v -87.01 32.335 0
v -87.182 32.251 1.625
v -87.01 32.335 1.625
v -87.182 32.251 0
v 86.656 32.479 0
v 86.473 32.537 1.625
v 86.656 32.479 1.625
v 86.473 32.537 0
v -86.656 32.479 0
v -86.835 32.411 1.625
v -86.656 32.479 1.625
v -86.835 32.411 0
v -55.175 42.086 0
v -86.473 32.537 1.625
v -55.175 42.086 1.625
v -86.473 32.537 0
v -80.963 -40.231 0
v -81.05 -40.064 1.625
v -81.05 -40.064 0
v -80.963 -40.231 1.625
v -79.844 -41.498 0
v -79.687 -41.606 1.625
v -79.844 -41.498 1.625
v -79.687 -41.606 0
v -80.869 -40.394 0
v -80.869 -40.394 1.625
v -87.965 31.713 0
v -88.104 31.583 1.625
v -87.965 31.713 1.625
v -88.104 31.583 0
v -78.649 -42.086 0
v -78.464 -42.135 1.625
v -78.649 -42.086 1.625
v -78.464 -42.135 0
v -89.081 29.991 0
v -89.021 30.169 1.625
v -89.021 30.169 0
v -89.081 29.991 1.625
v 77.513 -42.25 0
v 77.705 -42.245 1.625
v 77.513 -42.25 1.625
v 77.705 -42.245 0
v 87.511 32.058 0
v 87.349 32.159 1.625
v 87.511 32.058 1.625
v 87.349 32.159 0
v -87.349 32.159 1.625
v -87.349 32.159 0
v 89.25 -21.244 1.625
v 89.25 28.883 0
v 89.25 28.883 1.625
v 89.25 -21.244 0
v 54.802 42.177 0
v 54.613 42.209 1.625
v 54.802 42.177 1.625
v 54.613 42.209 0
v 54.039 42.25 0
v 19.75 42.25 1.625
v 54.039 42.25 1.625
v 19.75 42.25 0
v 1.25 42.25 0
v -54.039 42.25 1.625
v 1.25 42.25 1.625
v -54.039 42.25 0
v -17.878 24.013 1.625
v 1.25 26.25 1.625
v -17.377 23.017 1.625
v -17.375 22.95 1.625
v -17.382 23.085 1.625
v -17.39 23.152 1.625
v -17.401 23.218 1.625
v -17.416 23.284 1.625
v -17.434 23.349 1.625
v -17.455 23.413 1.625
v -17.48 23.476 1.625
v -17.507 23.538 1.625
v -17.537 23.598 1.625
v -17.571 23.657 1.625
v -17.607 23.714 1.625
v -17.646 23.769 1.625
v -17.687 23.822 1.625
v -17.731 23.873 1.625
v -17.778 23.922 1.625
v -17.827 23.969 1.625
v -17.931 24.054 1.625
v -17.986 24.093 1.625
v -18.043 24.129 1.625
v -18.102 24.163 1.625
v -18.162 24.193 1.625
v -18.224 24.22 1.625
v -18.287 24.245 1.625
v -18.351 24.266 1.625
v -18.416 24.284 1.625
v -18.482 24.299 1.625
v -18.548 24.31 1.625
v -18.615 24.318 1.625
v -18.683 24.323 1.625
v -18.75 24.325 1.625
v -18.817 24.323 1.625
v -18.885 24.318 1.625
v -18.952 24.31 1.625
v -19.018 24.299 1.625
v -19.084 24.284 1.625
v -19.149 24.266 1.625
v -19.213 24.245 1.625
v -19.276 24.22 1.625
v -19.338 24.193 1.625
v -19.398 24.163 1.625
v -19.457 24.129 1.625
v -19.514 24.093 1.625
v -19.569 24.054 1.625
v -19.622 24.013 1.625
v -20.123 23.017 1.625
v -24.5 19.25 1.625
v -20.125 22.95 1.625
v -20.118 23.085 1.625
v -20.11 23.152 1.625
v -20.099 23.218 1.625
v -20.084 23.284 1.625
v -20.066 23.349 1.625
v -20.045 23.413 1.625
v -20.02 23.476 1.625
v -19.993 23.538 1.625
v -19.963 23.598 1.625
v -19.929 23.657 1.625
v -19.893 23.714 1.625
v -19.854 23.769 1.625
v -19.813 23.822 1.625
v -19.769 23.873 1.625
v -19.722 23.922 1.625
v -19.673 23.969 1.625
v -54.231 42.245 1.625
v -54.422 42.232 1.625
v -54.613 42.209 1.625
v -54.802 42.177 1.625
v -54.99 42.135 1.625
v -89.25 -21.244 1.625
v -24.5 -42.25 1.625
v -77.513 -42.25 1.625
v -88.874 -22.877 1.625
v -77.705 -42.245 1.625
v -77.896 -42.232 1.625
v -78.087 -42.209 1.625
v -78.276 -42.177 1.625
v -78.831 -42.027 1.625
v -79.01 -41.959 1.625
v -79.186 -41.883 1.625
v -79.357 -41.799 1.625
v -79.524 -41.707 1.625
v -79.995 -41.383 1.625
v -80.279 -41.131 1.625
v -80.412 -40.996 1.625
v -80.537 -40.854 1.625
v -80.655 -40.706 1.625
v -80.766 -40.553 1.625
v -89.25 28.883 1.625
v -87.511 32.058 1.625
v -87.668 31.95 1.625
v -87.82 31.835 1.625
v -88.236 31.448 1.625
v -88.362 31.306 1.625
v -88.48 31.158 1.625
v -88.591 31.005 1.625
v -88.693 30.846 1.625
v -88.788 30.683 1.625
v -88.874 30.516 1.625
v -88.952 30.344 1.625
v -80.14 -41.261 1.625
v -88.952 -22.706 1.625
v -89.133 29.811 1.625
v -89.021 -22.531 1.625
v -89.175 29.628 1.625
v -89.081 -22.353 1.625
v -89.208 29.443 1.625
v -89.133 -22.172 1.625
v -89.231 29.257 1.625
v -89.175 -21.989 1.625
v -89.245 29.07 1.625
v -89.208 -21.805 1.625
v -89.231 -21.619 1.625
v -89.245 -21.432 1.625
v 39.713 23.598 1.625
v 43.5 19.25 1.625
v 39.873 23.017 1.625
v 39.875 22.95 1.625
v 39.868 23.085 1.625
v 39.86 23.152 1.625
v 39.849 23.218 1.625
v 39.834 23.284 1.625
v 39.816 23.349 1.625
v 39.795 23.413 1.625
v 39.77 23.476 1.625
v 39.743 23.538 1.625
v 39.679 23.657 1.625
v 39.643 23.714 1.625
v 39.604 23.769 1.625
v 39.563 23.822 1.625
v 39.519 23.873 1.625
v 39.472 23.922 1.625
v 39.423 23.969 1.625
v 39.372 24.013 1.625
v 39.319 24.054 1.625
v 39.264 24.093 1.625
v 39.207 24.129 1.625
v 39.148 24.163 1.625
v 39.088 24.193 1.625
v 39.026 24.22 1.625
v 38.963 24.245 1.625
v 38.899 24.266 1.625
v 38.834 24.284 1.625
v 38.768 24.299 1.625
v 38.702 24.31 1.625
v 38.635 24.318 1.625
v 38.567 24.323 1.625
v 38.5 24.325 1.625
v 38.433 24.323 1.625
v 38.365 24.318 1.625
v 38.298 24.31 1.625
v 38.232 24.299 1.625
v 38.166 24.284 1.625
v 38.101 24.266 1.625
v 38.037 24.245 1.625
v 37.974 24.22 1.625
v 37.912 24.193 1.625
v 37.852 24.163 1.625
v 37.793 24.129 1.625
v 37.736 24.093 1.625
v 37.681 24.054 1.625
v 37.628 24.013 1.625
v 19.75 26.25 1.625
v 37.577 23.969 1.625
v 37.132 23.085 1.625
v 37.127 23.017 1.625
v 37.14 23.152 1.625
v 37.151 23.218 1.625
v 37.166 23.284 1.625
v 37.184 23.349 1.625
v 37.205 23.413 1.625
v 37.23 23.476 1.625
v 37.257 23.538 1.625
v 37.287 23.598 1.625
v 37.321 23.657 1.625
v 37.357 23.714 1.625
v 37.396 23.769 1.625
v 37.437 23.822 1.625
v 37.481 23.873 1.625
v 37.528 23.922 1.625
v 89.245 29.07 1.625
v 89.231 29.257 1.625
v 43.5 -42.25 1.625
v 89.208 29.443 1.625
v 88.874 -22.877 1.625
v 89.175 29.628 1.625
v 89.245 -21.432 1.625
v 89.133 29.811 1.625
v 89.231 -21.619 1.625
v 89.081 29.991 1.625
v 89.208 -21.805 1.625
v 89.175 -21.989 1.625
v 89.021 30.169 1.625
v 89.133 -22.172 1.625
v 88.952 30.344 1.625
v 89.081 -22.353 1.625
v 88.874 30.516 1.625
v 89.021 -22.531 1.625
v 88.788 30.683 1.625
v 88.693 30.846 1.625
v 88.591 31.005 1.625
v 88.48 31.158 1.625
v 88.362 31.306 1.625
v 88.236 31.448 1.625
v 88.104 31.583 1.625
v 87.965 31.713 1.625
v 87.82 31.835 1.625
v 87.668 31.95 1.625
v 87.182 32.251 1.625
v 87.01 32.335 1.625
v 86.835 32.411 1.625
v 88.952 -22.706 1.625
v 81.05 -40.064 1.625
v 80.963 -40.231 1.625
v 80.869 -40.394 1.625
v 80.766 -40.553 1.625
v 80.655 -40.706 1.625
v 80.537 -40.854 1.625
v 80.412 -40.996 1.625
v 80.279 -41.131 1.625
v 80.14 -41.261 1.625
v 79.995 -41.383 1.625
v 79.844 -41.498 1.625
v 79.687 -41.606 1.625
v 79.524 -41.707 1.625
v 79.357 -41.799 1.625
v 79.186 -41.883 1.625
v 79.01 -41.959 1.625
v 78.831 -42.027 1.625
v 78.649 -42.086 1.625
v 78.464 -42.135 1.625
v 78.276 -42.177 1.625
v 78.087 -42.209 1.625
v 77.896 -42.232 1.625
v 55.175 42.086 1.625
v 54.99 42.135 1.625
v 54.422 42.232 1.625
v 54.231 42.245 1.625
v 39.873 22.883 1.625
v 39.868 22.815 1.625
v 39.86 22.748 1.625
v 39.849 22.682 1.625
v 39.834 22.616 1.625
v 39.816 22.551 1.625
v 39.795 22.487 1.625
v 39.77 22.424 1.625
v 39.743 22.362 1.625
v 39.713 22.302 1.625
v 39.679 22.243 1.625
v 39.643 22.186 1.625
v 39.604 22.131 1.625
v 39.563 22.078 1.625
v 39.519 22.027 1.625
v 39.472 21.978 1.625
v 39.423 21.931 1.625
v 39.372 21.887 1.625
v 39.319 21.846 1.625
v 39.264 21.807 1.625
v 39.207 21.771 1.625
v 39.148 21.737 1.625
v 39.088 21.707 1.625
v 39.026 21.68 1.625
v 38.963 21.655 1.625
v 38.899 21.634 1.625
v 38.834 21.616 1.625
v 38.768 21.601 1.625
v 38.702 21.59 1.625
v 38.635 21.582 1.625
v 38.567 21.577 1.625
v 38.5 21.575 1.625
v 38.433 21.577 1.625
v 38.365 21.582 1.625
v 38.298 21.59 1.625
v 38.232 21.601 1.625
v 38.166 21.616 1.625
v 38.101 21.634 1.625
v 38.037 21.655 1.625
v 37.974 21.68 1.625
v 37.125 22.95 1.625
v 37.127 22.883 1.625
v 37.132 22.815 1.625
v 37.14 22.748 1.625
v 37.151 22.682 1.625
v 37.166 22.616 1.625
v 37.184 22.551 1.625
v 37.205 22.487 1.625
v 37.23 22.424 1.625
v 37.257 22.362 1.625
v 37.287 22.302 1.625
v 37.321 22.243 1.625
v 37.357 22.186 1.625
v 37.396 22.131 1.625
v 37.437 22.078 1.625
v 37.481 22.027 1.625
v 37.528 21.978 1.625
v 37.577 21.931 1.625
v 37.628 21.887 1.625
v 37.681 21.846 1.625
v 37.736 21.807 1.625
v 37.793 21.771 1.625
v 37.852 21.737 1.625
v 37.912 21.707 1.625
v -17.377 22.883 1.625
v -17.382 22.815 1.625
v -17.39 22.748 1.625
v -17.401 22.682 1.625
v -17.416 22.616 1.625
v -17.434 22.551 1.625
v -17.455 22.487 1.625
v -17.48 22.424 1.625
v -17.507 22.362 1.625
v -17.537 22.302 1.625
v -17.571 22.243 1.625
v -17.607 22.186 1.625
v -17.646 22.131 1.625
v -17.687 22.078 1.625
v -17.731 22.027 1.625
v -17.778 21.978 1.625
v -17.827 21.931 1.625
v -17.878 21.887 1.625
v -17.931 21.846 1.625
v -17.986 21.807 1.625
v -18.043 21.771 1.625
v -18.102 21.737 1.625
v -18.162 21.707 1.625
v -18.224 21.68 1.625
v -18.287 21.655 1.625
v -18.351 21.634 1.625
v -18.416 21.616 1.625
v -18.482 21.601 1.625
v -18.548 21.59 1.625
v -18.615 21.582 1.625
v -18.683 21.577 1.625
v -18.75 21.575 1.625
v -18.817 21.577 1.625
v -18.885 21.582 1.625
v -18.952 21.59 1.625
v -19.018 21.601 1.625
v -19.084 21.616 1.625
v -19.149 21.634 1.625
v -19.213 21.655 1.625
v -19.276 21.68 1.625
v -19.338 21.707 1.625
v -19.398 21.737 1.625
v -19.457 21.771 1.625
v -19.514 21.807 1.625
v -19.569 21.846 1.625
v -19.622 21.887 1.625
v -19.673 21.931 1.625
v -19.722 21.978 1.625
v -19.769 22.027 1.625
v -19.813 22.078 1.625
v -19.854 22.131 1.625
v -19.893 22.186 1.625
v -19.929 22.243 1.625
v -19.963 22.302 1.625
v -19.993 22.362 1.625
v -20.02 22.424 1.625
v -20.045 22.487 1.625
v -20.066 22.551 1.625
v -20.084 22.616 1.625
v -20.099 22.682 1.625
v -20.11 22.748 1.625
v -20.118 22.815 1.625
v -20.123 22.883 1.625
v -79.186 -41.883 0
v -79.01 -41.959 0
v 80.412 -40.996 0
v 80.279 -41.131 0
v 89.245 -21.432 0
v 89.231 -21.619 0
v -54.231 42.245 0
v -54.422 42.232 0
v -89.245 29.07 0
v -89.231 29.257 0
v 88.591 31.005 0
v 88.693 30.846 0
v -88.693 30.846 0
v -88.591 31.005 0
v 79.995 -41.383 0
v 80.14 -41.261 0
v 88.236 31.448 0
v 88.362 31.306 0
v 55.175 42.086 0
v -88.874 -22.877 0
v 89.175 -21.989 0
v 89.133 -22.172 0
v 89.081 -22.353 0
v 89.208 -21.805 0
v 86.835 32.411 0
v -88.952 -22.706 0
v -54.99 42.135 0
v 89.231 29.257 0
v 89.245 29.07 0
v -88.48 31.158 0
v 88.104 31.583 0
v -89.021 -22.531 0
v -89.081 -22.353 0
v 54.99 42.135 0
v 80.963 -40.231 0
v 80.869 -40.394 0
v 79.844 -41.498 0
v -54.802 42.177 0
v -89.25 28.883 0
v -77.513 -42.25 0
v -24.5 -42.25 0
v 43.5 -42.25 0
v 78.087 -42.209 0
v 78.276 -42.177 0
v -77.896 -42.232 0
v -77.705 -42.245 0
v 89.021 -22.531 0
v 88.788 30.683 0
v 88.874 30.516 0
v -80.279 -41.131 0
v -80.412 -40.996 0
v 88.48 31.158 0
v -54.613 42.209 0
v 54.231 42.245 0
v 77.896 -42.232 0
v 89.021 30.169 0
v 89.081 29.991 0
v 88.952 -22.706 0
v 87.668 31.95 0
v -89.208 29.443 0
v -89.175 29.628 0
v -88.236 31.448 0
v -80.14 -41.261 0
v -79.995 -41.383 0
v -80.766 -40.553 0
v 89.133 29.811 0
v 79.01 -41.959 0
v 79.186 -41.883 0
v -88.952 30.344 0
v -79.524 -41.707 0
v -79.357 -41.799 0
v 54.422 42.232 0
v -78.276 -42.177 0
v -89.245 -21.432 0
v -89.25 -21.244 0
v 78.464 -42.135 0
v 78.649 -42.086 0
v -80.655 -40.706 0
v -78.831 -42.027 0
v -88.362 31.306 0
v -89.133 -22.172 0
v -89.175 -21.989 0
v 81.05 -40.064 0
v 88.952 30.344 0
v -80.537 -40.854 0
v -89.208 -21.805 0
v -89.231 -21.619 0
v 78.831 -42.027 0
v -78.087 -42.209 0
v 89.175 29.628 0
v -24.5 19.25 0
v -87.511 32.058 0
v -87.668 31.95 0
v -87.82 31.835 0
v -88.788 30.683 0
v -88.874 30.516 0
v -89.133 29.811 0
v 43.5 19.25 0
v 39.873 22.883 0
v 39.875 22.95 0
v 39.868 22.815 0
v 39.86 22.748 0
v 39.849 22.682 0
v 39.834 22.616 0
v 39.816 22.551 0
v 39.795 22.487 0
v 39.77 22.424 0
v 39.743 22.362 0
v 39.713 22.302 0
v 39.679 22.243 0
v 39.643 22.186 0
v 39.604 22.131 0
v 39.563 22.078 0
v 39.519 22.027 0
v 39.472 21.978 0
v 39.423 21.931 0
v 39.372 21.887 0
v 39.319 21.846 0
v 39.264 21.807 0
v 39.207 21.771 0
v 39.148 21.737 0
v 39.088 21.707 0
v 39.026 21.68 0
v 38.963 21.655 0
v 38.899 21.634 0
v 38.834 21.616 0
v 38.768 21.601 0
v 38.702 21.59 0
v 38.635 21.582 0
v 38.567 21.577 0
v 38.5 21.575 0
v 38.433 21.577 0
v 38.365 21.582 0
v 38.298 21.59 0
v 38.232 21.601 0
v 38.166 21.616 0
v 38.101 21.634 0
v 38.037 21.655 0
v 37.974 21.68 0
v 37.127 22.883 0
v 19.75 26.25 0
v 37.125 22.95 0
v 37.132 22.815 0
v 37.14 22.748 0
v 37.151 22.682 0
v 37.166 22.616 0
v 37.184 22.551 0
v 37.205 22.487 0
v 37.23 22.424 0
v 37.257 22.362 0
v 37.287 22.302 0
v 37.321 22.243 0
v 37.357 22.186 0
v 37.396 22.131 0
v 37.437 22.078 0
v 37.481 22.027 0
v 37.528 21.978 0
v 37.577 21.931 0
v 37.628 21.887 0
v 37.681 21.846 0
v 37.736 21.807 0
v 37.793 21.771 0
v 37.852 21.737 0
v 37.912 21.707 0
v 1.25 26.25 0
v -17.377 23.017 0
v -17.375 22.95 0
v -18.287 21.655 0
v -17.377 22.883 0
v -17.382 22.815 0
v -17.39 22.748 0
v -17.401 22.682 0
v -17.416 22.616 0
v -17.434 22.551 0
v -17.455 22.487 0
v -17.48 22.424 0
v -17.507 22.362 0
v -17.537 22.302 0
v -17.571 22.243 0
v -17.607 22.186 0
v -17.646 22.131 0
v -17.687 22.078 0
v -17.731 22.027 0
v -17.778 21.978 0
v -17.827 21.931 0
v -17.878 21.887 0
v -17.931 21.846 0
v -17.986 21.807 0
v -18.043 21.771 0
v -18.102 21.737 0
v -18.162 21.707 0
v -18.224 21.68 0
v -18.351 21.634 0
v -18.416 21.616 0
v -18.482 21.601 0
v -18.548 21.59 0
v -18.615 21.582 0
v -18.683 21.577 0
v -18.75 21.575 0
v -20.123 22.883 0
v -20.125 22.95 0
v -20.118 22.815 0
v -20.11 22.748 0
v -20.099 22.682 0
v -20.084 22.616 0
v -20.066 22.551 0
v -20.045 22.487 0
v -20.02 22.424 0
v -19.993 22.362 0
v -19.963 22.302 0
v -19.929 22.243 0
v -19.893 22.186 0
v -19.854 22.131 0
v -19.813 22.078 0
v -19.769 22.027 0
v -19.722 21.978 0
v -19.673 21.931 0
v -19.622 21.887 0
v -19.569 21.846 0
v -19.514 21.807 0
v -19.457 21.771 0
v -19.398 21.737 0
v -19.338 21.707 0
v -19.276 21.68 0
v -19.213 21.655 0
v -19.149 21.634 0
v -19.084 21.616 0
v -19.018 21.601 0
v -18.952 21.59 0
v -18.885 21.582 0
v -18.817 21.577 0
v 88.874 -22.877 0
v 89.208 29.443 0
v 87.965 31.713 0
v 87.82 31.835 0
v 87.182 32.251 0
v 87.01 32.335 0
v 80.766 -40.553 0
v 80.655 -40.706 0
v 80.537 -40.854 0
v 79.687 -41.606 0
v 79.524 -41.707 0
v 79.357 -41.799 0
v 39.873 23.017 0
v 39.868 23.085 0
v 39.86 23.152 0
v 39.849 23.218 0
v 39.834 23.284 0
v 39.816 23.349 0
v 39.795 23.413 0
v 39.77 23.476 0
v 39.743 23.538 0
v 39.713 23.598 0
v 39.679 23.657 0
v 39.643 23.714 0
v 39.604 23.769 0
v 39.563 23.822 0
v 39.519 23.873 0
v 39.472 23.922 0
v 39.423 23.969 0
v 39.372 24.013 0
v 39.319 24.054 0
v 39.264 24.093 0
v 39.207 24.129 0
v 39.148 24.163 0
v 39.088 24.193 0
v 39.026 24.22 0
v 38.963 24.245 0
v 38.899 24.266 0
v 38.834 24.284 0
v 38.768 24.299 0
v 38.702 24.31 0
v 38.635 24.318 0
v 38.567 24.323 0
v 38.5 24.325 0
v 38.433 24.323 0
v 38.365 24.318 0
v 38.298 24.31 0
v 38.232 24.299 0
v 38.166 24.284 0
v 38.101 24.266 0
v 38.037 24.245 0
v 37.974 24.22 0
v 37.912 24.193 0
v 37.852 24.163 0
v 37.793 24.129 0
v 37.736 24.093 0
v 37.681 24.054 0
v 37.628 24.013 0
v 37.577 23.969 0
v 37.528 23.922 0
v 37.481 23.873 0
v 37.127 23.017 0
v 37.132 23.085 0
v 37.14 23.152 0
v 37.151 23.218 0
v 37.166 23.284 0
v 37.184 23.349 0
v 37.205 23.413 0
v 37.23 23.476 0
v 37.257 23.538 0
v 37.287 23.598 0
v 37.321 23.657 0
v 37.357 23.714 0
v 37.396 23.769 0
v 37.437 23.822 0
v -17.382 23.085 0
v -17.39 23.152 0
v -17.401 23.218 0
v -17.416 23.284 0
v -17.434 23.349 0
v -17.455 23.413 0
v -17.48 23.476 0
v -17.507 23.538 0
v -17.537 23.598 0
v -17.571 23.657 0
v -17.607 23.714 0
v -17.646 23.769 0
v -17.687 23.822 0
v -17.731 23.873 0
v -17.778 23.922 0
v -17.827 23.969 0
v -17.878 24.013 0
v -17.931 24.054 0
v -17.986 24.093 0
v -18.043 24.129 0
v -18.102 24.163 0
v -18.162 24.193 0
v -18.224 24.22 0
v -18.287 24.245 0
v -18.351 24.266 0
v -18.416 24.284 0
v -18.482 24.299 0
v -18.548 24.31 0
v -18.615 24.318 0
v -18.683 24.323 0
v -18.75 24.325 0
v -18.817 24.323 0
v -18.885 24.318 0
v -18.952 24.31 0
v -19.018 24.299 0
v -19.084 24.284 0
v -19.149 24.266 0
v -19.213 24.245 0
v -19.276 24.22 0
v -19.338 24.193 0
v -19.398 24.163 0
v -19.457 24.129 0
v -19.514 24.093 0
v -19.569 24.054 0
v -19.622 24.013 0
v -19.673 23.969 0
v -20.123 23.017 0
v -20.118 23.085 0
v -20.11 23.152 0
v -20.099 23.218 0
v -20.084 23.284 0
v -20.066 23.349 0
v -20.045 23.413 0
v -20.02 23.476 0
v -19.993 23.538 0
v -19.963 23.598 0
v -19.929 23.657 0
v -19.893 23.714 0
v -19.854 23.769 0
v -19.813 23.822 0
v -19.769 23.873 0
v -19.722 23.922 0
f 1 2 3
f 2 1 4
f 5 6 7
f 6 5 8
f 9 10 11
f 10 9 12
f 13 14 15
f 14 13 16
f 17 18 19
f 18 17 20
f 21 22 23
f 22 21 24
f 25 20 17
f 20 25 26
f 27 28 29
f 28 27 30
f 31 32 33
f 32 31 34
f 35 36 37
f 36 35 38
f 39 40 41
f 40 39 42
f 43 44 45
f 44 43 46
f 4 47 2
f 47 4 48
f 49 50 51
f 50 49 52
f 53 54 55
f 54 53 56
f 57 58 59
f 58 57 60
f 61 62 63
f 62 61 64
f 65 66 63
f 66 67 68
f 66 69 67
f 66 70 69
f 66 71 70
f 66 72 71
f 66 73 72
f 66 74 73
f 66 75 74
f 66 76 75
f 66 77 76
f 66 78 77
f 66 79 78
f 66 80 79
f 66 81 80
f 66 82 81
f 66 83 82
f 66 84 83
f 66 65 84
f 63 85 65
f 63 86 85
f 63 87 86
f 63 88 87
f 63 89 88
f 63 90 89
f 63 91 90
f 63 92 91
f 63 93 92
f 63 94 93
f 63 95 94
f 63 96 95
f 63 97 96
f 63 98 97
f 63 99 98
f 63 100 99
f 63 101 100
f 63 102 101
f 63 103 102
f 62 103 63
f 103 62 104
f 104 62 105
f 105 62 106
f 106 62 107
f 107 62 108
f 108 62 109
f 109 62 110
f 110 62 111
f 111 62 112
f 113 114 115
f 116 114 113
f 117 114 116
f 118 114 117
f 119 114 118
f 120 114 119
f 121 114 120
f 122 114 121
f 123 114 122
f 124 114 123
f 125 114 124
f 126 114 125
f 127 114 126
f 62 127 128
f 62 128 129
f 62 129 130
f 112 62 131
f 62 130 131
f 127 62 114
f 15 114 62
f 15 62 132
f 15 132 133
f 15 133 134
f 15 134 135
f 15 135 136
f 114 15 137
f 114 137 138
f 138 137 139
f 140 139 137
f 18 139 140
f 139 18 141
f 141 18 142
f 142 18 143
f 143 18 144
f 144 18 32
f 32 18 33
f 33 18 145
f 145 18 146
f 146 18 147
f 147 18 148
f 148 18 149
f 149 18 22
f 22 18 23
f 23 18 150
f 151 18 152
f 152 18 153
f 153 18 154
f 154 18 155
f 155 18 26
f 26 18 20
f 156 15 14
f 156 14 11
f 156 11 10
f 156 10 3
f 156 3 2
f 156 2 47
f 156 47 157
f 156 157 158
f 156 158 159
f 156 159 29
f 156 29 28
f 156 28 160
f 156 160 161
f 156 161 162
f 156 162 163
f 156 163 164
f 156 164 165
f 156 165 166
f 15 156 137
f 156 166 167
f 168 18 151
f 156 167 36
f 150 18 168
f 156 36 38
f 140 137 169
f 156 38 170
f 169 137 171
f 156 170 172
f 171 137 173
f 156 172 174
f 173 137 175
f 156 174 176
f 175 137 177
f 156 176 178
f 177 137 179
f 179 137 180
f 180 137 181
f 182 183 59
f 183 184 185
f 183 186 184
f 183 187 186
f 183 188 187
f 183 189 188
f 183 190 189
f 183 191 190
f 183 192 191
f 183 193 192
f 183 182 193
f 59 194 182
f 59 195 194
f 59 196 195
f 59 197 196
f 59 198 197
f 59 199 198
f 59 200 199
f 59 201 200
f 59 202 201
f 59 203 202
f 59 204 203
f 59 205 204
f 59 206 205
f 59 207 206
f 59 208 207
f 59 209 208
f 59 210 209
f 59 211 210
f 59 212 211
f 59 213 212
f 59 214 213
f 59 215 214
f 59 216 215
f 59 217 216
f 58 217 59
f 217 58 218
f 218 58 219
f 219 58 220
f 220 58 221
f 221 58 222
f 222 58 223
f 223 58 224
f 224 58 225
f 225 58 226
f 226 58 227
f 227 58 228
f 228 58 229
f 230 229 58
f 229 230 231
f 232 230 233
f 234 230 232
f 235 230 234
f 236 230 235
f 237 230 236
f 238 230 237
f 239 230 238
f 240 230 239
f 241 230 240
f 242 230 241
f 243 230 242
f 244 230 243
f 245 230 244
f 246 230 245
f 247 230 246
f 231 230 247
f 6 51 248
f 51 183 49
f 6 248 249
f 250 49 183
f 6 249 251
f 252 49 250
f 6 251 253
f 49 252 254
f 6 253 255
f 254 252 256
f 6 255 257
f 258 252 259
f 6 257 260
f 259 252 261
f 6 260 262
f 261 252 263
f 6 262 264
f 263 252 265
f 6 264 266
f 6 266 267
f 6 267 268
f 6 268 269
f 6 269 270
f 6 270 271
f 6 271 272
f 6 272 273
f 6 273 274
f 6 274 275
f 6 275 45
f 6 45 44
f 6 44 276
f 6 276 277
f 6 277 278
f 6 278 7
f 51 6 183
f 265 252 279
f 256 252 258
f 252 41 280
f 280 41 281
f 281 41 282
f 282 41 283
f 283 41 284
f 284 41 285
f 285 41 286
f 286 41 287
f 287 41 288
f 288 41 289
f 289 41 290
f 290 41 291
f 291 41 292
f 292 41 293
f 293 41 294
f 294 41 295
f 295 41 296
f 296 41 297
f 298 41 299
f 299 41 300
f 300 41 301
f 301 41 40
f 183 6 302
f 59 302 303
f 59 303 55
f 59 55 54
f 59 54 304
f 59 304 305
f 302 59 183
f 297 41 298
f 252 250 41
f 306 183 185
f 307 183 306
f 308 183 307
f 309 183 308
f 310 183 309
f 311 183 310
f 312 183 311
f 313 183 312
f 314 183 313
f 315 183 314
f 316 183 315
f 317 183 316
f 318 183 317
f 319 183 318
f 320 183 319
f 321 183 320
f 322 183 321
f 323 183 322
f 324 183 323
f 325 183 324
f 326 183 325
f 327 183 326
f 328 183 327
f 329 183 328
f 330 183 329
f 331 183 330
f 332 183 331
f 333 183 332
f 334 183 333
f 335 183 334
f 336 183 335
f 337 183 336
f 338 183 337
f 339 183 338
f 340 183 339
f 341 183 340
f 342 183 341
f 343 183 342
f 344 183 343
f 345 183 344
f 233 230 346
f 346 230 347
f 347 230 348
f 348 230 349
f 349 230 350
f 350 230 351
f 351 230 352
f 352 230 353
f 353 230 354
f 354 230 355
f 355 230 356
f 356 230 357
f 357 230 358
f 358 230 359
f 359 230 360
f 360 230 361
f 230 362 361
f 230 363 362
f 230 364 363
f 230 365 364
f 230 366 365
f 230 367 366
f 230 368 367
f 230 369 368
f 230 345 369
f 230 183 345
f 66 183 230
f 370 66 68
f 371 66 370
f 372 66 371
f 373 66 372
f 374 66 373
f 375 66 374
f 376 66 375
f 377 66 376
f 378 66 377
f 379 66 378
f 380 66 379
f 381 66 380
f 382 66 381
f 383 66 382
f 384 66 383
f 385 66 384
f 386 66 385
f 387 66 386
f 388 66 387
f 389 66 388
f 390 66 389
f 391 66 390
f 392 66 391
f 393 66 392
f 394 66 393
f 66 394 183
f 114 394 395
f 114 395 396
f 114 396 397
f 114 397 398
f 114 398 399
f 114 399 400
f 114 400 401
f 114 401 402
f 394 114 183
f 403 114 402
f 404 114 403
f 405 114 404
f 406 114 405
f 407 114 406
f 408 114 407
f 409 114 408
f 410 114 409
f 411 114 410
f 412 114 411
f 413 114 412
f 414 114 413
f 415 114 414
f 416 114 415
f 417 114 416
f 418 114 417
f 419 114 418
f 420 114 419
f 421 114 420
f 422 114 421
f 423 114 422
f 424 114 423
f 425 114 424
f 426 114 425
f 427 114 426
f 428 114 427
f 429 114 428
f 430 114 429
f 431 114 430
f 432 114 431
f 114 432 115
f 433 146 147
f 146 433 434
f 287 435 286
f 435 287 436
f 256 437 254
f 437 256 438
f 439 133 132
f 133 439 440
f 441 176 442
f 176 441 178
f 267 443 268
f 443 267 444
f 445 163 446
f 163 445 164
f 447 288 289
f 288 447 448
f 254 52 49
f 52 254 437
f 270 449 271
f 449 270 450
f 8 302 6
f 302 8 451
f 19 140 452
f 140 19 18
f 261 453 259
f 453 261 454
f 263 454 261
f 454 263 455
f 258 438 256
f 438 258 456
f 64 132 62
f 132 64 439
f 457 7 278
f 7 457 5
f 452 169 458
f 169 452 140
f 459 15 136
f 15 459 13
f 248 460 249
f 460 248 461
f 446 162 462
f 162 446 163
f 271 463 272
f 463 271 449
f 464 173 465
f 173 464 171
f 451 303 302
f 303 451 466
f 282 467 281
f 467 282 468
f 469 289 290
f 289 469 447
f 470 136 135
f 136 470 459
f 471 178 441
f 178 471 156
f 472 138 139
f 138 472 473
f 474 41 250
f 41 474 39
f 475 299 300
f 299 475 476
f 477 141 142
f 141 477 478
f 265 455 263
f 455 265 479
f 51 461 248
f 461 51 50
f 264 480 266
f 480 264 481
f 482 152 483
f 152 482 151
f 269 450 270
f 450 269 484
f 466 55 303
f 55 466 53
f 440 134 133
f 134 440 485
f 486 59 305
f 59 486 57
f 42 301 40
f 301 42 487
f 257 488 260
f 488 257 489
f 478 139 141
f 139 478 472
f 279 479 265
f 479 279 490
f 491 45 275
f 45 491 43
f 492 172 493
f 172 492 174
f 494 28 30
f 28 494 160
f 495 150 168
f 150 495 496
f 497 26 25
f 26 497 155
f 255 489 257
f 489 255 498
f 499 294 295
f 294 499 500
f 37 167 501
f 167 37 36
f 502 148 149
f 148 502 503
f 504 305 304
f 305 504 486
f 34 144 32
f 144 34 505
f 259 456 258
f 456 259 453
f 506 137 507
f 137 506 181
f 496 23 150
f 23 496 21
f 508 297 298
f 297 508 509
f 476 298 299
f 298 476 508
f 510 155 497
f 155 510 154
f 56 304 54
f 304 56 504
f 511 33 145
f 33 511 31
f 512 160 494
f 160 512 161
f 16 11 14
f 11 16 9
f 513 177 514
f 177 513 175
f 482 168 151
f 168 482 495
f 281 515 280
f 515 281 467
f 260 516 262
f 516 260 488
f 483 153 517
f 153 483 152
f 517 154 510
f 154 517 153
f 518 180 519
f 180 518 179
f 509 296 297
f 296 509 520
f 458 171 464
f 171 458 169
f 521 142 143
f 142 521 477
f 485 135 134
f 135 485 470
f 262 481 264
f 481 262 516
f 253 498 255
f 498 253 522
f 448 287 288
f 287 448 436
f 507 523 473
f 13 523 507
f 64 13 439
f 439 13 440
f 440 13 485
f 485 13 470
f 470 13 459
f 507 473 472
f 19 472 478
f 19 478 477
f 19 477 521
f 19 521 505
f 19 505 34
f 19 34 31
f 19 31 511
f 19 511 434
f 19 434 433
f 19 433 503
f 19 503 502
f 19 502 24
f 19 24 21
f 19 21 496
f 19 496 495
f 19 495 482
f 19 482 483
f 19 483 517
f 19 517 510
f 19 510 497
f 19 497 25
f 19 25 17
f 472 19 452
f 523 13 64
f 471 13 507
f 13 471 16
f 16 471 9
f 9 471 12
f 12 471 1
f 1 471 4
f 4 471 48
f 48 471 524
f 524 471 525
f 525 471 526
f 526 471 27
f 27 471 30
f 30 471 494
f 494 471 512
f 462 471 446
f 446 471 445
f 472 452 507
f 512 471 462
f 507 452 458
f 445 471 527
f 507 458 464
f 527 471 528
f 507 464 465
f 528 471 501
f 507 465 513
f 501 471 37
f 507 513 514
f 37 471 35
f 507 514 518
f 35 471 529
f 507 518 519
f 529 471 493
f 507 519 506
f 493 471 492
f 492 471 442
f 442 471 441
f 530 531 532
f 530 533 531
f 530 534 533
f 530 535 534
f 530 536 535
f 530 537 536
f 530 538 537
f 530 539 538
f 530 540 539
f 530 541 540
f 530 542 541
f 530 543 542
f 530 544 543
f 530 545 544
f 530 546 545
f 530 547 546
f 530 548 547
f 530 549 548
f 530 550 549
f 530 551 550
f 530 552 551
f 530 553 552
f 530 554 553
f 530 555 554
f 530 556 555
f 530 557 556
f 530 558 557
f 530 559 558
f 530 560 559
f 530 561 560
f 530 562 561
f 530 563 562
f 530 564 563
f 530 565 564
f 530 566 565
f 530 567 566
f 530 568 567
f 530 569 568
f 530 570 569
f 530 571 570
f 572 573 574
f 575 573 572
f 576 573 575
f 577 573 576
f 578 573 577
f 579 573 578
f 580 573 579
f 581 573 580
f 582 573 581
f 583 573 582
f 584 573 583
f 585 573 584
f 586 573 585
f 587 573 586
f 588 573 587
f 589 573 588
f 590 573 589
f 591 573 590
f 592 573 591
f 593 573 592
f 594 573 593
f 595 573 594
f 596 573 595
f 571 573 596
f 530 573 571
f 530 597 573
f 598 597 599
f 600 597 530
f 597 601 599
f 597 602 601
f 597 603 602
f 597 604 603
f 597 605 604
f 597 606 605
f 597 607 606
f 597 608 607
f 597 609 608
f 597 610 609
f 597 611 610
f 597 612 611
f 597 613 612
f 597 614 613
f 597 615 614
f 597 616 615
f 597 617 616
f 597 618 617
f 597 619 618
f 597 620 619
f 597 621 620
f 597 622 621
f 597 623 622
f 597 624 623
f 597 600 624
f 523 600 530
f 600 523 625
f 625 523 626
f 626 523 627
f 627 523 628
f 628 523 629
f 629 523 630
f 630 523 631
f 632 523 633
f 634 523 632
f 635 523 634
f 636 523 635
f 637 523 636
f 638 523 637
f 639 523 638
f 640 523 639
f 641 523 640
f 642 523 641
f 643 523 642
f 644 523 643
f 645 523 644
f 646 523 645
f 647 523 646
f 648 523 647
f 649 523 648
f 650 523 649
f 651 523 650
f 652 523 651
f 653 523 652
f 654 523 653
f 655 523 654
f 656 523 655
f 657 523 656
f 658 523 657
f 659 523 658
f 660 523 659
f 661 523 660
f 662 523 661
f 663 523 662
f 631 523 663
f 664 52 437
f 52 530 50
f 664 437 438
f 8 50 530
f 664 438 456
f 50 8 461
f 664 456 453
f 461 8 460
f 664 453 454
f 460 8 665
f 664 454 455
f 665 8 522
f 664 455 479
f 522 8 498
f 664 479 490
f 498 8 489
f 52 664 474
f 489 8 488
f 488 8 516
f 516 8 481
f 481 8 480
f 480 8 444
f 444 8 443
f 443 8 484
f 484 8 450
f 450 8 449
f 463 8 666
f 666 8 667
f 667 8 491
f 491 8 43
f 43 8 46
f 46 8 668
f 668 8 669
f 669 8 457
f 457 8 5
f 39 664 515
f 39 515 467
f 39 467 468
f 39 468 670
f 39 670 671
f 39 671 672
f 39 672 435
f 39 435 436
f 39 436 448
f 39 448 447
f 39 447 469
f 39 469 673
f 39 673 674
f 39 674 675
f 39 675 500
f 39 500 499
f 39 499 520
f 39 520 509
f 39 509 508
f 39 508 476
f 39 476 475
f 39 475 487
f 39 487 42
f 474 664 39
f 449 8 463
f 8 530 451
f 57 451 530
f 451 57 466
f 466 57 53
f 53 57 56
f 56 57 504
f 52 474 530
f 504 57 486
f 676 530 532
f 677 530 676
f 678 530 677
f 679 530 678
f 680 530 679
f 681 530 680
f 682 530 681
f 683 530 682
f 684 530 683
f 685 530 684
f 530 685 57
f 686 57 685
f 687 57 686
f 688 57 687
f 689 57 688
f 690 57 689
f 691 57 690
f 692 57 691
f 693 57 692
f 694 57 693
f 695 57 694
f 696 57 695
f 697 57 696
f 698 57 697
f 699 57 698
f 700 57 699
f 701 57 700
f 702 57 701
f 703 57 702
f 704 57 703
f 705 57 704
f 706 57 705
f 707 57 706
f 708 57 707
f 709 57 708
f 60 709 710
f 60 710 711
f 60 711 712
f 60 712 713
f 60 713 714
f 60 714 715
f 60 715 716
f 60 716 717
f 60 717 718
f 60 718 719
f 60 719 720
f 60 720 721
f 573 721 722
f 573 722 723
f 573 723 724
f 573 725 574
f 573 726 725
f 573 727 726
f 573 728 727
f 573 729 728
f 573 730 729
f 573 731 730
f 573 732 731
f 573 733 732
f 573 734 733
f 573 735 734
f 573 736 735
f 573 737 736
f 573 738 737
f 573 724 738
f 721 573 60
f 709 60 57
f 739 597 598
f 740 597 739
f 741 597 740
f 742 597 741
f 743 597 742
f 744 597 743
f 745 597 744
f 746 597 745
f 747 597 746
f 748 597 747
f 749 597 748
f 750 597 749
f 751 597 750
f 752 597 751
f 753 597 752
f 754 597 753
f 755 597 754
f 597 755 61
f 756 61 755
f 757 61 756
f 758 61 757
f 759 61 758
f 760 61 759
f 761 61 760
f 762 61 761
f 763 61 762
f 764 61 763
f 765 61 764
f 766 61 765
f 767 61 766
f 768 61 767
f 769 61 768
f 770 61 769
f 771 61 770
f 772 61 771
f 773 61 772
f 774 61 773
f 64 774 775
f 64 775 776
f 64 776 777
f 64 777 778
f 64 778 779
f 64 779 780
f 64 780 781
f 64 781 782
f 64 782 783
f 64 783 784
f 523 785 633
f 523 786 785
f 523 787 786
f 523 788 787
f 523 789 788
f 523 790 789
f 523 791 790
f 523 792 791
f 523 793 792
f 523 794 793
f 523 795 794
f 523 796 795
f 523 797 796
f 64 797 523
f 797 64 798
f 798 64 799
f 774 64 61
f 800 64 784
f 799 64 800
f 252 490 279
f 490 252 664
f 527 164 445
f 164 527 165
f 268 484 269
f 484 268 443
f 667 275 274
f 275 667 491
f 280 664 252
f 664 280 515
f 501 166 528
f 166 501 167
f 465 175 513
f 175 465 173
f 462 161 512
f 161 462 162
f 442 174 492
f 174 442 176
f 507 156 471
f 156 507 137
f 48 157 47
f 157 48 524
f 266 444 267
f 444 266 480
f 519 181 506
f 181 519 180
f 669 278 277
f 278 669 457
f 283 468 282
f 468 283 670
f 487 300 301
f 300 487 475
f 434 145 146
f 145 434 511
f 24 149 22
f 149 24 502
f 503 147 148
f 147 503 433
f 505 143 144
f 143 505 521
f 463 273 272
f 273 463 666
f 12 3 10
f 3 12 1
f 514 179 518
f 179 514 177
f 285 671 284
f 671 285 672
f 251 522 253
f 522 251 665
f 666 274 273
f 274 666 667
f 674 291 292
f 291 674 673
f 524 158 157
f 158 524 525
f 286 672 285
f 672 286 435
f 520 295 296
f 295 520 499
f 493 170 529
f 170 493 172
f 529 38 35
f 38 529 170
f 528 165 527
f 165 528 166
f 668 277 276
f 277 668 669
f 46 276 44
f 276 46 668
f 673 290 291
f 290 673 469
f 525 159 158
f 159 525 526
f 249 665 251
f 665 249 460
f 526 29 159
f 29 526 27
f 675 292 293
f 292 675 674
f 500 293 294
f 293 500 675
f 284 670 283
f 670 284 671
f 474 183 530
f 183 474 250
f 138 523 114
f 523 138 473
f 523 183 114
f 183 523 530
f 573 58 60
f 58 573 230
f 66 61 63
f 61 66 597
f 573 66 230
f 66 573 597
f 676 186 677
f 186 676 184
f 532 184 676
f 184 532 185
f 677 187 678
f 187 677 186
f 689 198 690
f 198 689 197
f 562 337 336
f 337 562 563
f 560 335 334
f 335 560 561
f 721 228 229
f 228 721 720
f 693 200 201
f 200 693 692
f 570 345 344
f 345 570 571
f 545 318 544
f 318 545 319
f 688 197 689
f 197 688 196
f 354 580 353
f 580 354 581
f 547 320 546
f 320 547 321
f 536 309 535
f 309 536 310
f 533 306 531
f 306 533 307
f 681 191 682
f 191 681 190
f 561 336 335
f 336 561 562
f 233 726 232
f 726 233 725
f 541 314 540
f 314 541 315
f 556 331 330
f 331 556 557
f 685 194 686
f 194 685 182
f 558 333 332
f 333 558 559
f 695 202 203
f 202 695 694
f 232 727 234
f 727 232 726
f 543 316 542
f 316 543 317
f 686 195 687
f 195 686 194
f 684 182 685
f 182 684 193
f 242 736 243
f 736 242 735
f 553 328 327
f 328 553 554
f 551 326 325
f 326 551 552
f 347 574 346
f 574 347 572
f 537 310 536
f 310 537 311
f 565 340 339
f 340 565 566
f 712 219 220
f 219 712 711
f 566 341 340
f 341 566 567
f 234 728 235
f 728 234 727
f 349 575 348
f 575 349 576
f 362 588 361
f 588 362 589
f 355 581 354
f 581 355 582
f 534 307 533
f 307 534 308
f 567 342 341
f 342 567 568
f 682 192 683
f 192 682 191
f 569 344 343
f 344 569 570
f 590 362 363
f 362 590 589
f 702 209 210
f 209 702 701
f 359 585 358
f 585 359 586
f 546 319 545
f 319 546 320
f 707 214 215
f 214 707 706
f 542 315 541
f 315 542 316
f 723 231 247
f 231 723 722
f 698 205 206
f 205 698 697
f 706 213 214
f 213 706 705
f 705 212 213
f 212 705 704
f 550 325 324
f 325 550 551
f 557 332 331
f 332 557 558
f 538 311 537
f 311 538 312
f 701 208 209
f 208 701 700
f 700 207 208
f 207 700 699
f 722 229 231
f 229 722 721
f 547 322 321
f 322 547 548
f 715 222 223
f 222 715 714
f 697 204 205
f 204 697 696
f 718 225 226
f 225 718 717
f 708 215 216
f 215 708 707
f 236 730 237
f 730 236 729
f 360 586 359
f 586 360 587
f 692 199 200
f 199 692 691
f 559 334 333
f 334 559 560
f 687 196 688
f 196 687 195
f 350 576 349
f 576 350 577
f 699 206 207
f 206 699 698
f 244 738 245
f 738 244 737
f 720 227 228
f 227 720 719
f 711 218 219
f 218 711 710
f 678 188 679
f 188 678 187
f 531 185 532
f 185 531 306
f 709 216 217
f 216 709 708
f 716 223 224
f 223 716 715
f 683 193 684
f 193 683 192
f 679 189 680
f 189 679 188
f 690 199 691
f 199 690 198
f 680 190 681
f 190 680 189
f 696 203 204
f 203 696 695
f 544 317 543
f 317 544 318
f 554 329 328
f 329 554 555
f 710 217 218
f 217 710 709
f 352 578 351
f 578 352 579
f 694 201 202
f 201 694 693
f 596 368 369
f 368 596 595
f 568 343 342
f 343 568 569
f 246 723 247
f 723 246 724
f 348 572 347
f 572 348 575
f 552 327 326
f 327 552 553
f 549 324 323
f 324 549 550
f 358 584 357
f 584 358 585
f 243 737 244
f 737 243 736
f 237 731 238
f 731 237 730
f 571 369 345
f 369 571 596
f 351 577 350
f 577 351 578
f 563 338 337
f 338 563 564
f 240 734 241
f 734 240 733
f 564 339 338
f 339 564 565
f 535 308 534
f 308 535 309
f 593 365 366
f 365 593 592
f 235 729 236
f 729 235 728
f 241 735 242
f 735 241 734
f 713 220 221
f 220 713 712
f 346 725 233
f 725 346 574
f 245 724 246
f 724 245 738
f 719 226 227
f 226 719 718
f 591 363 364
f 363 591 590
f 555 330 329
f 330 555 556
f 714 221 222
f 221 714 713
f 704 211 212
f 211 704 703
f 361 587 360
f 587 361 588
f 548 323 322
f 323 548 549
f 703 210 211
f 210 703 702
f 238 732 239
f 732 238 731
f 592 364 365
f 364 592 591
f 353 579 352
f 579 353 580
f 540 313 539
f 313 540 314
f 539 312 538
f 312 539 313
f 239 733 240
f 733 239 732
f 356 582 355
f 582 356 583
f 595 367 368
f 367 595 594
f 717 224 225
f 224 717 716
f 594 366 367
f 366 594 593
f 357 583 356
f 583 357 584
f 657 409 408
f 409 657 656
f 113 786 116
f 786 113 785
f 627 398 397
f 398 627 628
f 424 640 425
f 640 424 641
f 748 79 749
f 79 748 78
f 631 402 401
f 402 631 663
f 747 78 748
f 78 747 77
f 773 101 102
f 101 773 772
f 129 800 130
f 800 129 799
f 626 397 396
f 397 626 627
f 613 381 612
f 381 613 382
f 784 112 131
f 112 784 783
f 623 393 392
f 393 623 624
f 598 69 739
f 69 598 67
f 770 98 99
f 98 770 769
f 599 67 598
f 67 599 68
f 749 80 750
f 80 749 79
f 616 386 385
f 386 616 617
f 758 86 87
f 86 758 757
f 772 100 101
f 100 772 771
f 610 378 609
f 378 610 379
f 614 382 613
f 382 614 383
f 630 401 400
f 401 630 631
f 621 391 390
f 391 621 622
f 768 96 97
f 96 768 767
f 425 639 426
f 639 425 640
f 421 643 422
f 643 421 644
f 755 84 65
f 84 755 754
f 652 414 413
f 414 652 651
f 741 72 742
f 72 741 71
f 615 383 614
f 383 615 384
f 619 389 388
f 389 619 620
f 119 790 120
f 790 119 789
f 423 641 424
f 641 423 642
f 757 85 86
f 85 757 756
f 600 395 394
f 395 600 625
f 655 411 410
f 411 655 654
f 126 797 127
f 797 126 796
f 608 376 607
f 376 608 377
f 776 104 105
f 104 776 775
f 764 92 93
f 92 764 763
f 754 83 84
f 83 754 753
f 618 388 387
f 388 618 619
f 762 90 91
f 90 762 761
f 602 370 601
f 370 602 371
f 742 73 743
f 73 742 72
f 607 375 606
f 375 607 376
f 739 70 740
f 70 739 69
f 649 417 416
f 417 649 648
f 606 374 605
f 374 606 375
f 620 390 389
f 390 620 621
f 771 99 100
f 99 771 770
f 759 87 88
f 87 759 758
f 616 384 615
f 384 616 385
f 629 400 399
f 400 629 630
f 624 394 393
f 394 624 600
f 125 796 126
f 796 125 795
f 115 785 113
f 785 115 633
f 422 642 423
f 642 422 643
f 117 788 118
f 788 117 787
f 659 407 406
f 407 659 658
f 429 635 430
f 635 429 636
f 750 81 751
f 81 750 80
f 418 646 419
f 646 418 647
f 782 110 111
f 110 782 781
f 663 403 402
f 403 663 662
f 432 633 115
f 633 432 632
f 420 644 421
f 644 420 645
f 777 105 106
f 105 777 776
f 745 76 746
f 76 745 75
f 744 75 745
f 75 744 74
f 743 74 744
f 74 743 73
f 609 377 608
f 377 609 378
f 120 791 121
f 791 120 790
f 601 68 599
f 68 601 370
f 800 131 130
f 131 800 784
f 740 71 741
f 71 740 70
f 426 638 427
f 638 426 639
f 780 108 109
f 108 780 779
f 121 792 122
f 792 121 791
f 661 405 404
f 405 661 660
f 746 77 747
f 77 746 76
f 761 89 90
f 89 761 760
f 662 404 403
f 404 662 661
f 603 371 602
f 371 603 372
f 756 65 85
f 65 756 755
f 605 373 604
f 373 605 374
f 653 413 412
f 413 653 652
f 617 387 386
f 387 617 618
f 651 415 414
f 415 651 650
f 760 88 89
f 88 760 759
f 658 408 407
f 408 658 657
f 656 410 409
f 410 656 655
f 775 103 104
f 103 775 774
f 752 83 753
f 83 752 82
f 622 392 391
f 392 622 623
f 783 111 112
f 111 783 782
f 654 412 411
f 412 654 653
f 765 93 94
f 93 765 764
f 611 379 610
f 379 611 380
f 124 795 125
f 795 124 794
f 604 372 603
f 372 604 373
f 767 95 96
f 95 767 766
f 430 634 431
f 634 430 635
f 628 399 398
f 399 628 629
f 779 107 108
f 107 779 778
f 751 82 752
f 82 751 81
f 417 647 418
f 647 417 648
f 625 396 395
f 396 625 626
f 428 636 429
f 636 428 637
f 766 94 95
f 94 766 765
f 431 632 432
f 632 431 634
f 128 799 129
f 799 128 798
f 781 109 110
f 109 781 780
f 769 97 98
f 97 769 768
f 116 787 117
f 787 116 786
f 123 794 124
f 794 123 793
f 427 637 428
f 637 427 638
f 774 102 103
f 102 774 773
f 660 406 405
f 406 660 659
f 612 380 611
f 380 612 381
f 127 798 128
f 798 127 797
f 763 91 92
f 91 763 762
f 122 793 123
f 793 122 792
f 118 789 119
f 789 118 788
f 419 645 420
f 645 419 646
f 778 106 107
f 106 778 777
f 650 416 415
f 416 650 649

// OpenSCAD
// --- INCLUDES ---
/*
All common dimensions are stored in their own SCAD file so that variables are consistent throughout
the multiple files created for this project.
*/
include <Common_Dimensions.scad>

// --- RENDER RESOLUTION ---
/*
Set the rendering resolution. Lower for lower-power systems.
*/
$fn = 128;

// --- DIMENSIONS ---
/*
Local dimensions that are specific to this drawing
*/

// --- MODULES ---
/*
Cutouts and extrusions are all mapped to their own modules to make the model more readable and
reusable.
*/

// Draw the main plate solid before cutouts
module inner_frame_solid()
{
    scale(frame_scale) hull()
    {
        for (corner = main_body_corners)
            translate(corner) cylinder(r=main_body_corner_radius, h=frame_thickness);
    }
}

// Create a cutout for the single-board computer
module sbc_cutout()
{
    cube([sbc_cutout_w, sbc_cutout_h, frame_thickness]);
}

// Create a cutout for the HDMI cable
module hdmi_cutout()
{
    cube([hdmi_cutout_w, hdmi_cutout_h, frame_thickness]);
}

// --- MAIN BODY MODULES ---
/*
Create the main body modules
*/

// Actually create the inner frame
module inner_frame_v1()
{
    difference()
    {
        inner_frame_solid();
       
        translate(sbc_cutout_offset) sbc_cutout();
        translate(hdmi_cutout_offset) hdmi_cutout();
       
        translate([ screen_w / 2 - screen_post_outer_dia / 2 + mount_hole_x_offset_right, screen_h / 2 - mount_hole_y_offset]) cylinder(d=mount_hole_dia, h=frame_thickness);
        translate([-screen_w / 2 + screen_post_outer_dia / 2 + mount_hole_x_offset_left,  screen_h / 2 - mount_hole_y_offset]) cylinder(d=mount_hole_dia, h=frame_thickness);
    }
}

// Creates a 2D projection of the 3D object
//
// Note - To work with KiCAD, export as a DXF
//
module pcb_shape()
{
    projection(cut=false) inner_frame_solid();
}

// --- RENDER ---
/*
Actually draw the main shell - in this case, just draw the PCB shape to be exported.
*/
inner_frame_v1();
